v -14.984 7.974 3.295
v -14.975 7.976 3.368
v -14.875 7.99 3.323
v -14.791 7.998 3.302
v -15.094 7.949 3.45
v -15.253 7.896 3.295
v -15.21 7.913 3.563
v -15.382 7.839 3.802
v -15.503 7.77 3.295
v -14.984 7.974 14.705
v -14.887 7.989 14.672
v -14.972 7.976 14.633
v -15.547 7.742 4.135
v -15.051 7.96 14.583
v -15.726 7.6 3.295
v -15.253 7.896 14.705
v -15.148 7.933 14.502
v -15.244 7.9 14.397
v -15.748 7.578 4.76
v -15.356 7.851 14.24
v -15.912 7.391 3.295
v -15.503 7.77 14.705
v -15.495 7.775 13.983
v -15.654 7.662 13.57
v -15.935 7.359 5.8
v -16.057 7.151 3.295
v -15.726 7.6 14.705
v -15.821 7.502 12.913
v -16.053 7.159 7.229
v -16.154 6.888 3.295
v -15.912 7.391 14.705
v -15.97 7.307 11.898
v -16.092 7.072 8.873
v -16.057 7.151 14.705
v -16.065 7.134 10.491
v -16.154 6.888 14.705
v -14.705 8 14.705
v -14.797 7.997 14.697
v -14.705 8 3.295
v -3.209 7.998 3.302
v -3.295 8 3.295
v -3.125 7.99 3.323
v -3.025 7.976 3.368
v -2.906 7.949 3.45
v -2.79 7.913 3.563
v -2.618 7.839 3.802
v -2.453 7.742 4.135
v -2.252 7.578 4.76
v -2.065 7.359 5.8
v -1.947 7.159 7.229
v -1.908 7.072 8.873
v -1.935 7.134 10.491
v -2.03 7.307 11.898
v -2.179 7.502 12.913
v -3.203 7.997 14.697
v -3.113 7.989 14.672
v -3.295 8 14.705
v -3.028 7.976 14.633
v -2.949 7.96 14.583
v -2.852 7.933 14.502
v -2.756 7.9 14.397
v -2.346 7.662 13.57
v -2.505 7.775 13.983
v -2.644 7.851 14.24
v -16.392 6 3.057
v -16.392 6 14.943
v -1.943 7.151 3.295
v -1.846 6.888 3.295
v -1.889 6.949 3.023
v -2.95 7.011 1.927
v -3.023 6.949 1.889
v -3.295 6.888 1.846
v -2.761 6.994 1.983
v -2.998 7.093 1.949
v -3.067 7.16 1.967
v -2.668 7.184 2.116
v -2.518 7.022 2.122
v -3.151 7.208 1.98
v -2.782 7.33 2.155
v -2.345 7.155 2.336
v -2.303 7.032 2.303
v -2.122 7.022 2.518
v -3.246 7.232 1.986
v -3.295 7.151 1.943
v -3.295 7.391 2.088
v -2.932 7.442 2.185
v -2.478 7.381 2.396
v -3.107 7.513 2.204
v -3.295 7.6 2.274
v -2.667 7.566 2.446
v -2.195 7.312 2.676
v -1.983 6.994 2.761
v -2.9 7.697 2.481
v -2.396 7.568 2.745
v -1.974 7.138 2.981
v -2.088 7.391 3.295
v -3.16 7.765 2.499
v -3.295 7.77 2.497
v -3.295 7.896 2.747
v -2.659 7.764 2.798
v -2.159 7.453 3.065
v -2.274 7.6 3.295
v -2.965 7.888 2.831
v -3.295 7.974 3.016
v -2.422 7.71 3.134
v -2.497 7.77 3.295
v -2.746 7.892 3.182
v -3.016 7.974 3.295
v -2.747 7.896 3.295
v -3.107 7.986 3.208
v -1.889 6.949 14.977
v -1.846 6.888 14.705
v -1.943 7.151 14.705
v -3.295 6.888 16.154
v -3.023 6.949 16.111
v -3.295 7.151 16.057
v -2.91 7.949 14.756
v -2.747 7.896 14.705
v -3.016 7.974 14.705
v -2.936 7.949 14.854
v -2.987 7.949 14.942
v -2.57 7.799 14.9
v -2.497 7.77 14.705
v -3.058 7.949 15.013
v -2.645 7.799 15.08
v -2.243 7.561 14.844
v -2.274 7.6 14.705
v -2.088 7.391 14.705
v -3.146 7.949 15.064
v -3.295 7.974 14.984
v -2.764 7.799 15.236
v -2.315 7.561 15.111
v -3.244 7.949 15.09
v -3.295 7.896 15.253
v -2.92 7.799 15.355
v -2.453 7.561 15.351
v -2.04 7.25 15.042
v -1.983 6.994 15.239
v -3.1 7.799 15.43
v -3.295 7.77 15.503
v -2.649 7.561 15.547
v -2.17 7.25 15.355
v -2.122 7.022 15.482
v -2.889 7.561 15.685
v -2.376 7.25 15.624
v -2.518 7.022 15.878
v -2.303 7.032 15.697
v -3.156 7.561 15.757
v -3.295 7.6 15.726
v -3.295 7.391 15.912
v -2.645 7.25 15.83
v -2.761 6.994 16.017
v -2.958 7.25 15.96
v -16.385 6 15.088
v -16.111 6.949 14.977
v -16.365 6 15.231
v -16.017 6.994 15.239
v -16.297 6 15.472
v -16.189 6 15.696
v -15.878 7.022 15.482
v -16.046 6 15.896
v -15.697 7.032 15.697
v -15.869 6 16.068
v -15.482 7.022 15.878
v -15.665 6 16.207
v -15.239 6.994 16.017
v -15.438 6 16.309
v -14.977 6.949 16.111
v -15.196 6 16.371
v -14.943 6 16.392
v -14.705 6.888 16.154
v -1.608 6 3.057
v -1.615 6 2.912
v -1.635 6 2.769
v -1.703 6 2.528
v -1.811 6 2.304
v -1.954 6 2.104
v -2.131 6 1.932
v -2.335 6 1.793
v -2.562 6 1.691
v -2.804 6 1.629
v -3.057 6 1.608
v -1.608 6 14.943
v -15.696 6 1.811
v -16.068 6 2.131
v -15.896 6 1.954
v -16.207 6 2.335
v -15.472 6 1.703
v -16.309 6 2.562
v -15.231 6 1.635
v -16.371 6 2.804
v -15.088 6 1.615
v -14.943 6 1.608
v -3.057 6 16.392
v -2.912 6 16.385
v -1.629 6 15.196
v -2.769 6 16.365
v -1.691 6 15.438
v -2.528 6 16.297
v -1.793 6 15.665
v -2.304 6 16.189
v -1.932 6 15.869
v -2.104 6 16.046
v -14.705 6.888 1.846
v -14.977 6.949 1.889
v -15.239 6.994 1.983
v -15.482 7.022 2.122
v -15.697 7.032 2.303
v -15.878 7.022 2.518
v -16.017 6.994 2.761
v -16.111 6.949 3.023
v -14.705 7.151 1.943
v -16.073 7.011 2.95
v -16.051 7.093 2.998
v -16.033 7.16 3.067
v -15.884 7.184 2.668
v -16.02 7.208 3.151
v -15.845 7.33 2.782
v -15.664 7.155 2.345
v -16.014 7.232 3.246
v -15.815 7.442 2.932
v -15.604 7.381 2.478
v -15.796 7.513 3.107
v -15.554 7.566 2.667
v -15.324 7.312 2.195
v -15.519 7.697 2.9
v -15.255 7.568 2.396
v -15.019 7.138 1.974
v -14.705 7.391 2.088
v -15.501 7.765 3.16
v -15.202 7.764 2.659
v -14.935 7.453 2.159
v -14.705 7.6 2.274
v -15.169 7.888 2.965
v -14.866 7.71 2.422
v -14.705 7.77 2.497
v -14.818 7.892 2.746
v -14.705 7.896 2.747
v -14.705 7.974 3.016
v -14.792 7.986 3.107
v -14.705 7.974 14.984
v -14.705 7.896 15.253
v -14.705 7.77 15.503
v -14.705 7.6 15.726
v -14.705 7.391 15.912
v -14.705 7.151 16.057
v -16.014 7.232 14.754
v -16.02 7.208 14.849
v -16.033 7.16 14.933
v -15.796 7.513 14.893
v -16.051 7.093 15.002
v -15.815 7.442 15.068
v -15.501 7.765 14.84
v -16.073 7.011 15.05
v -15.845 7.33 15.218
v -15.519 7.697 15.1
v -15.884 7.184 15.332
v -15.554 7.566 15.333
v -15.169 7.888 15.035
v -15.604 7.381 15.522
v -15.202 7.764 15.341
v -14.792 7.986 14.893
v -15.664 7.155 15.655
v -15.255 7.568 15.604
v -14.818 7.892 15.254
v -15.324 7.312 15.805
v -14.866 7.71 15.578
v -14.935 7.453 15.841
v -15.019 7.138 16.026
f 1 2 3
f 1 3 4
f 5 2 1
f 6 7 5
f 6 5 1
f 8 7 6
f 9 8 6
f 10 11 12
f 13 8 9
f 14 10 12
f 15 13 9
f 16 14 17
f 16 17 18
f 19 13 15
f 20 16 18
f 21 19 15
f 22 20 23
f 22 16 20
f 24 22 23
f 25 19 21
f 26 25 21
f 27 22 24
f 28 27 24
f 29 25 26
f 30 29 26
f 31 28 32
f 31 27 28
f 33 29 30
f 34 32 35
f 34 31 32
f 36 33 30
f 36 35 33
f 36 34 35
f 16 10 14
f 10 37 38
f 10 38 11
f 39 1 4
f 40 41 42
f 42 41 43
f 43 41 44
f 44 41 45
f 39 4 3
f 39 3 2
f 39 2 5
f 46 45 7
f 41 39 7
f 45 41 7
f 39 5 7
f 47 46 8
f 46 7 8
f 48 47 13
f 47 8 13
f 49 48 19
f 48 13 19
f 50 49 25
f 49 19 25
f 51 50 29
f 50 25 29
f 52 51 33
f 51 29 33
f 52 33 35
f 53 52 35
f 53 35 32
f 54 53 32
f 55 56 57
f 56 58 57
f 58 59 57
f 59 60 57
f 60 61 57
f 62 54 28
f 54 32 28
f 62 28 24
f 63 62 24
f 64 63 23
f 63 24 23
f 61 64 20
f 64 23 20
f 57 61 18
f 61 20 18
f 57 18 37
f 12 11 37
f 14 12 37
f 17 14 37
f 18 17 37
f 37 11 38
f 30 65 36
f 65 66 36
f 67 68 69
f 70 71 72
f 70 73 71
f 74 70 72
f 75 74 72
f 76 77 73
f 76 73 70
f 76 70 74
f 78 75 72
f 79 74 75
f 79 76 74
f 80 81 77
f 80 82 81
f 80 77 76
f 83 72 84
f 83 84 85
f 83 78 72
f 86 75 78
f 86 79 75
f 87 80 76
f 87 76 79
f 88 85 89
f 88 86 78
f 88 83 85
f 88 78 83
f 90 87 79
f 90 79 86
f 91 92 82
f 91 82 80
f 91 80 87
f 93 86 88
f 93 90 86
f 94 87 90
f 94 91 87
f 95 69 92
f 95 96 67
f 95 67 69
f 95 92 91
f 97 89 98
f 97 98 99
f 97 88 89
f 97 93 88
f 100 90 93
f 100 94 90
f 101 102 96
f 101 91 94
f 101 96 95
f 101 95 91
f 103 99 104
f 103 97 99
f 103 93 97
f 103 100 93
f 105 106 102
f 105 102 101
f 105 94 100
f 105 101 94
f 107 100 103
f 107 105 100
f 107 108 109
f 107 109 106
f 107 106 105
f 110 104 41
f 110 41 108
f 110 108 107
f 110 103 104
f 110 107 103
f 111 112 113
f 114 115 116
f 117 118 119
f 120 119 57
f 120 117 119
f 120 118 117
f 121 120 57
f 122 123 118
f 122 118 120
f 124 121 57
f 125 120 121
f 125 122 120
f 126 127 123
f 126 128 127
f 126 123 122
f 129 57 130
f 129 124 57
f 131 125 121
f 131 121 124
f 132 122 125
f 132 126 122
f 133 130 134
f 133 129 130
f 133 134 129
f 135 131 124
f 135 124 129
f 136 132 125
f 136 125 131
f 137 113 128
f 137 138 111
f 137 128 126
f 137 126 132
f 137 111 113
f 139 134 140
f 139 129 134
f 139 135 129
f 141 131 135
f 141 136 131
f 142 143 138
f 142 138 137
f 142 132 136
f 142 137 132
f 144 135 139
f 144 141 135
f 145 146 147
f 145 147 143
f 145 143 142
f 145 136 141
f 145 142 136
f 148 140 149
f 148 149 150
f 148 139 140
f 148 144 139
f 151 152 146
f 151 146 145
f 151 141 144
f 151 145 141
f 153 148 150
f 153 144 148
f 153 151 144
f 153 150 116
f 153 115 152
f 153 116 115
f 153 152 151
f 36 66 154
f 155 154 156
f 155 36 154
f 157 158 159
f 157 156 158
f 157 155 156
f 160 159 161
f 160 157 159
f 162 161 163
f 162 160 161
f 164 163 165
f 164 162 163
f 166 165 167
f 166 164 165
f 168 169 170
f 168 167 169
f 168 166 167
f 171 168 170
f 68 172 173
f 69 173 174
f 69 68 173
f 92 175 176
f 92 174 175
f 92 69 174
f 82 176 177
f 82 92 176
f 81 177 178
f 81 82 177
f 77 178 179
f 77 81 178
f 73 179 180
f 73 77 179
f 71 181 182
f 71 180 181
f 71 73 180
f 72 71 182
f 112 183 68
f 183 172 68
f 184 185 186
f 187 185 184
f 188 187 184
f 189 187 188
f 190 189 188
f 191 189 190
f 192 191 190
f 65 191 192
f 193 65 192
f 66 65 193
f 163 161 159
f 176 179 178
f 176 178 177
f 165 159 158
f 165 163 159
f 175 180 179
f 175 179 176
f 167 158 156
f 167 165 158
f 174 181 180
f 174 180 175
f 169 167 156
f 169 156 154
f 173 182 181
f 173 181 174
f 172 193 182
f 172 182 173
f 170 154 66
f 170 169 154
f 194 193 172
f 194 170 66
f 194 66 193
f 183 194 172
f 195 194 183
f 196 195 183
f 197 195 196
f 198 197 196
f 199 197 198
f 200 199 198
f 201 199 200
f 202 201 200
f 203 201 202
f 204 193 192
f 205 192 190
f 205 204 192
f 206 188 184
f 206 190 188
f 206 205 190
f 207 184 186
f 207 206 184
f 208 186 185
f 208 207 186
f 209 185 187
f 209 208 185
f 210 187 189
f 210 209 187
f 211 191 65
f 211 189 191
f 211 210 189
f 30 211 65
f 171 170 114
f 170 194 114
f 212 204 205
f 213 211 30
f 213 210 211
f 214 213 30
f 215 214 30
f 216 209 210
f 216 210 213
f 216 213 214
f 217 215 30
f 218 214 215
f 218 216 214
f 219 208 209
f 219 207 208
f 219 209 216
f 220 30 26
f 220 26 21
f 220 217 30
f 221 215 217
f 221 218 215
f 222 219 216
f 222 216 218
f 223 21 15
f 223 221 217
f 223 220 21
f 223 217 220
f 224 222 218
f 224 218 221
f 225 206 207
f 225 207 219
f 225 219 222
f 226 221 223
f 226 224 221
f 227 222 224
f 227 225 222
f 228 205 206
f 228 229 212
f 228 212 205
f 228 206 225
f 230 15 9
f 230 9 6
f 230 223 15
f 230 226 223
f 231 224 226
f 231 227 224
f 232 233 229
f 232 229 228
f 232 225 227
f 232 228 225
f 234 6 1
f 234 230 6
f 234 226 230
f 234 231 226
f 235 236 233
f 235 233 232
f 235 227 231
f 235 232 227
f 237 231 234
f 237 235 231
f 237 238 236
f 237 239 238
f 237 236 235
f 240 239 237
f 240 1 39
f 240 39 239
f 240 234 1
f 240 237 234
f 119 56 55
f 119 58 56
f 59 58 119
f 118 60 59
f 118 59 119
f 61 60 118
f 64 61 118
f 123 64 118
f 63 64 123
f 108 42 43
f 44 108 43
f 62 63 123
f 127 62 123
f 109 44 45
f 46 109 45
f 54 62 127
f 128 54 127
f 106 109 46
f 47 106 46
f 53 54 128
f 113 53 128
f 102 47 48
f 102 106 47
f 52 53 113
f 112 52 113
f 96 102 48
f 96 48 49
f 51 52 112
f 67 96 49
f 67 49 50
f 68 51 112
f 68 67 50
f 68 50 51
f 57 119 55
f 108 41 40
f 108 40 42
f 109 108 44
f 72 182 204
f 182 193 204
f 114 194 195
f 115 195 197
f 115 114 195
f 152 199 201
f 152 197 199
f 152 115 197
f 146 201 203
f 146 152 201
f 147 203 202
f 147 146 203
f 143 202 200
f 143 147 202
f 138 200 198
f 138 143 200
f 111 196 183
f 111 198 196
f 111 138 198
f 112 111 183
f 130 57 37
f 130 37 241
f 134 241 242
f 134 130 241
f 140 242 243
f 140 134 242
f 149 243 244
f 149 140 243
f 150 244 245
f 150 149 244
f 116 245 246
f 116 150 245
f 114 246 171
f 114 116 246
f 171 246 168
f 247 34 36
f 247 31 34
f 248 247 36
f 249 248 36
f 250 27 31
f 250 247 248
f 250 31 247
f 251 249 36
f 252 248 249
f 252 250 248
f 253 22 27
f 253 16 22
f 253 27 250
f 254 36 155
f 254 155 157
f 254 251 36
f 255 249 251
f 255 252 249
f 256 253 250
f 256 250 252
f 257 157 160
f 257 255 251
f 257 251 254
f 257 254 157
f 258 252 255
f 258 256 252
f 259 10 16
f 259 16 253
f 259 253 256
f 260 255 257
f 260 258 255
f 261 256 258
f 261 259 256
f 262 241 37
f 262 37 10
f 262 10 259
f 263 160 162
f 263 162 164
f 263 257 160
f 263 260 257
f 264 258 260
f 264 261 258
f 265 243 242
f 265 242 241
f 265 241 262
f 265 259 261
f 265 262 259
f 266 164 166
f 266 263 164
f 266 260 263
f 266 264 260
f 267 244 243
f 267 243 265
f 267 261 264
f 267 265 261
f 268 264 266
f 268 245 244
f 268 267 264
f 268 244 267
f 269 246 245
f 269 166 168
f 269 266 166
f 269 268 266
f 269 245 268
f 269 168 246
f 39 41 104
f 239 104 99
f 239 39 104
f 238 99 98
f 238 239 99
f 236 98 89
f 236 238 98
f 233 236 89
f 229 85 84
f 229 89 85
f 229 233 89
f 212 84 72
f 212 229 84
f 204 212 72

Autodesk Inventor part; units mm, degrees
ref_plane "YZ Plane" through (0, 0, 0) normal (1, 0, 0) x (0, 1, 0)
ref_plane "XZ Plane" through (0, 0, 0) normal (0, 1, 0) x (-1, 0, 0)
sketch "Sketch1" plane through (0, 0, 0) normal (0, 1, 0) x (-1, 0, 0)
  line L0 (0, 0) -> (18, 0)
  line L1 (18, 0) -> (18, 18)
  line L2 (18, 18) -> (0, 18)
  line L3 (0, 18) -> (0, 0)
  dimension "d0" = 18
  dimension "d1" = 18
extrude "Extrusion1" add sketch "Sketch1" along normal blind 8 draft -15
fillet "Fillet1" radius 1.5 8 edges at (-1.0718, 4, 16.9282) (-9, 8, 15.8564) (-2.1436, 8, 9) (-9, 8, 2.1436) (-1.0718, 4, 1.0718) (-16.9282, 4, 1.0718) (-16.9282, 4, 16.9282) (-15.8564, 8, 9)
ref_plane "Work Plane1" through (-9, 33.5885, 16.5511) normal (1, 0, 0) x (0, 0, -1)
sketch "Sketch2" plane through (-9, 33.5885, 16.5511) normal (1, 0, 0) x (0, 0, -1)
  line L0 (13.2565, -25.5885) -> (1.8457, -25.5885) projected
  arc A0 (14.7054, -26.7002) -> (13.2565, -25.5885) centre (13.2565, -27.0885) ccw projected
  arc A1 (1.8457, -25.5885) -> (13.2565, -25.5885) centre (7.5511, -8.5166) ccw
  point P0 (16.5511, -33.5885)
  point P1 (13.2565, -25.5885)
  dimension "d5" = 18
extrude "Extrusion2" cut sketch "Sketch2" along normal through all both and the other way through all
sketch "Sketch3" plane through (0, 0, 0) normal (0, -1, 0) x (1, 0, 0)
  line L0 (-16.5511, 18) -> (-1.4489, 18) construction
  line L1 (-9, 18) -> (-9, 0) construction
  line L2 (-1.4489, 0) -> (-16.5511, 0) construction
  line L3 (-18, 1.4489) -> (-18, 16.5511) construction
  line L4 (-18, 9) -> (0, 9) construction
  line L5 (-1, 1) -> (-17, 1)
  line L6 (-17, 1) -> (-17, 17)
  line L7 (-17, 17) -> (-1, 17)
  line L8 (-1, 17) -> (-1, 1)
  line L9 (-1, 1) -> (-17, 17) construction
  line L10 (-17, 1) -> (-1, 17) construction
  point P0 (0, 0)
  point P1 (-9, 9)
  point P2 (-9, 9)
  dimension "d8" = 16
  dimension "d9" = 16
extrude "Extrusion3" cut sketch "Sketch3" against normal blind 4.5 draft -15
sketch "Sketch4" plane through (0, 4.5, 0) normal (0, -1, 0) x (1, 0, 0)
  line L0 (-15.7942, 15.7942) -> (-15.7942, 2.2058) construction
  line L1 (-15.7942, 9) -> (-2.2058, 9) construction
  line L2 (-2.2058, 2.2058) -> (-2.2058, 15.7942) construction
  line L3 (-2.2058, 15.7942) -> (-15.7942, 15.7942) construction
  line L4 (-9, 15.7942) -> (-9, 2.2058) construction
  line L5 (-15.7942, 2.2058) -> (-2.2058, 2.2058) construction
  circle A0 centre (-9, 9) radius 2.775
  point P0 (0, 0)
  dimension "d12" = 5.55
extrude "Extrusion4" add sketch "Sketch4" along normal blind 4
sketch "Sketch5" plane through (-9, 0.5, 9) normal (0, -1, 0) x (1, 0, 0)
  line L0 (0.6, 2.075) -> (-0.6, 2.075)
  line L1 (-0.6, -2.075) -> (0.6, -2.075)
  line L2 (-0.6, 2.075) -> (0.6, -2.075) construction
  line L3 (-2.075, 0.6) -> (-2.075, -0.6)
  line L4 (2.075, -0.6) -> (2.075, 0.6)
  line L5 (2.075, 0.6) -> (-2.075, -0.6) construction
  line L6 (-2.075, 0.6) -> (2.075, -0.6) construction
  line L7 (-6.7942, 6.7942) -> (-6.7942, -6.7942) construction
  line L8 (-6.7942, 0) -> (6.7942, 0) construction
  line L9 (6.7942, -6.7942) -> (6.7942, 6.7942) construction
  line L10 (-6.7942, -6.7942) -> (6.7942, -6.7942) construction
  line L11 (0, -6.7942) -> (0, 6.7942) construction
  arc A0 (0.9, -0.6) -> (0.6, -0.9) centre (0.9, -0.9) ccw
  arc A1 (-0.6, -0.9) -> (-0.9, -0.6) centre (-0.9, -0.9) ccw
  arc A2 (0.6, 0.9) -> (0.9, 0.6) centre (0.9, 0.9) ccw
  arc A3 (-0.9, 0.6) -> (-0.6, 0.9) centre (-0.9, 0.9) ccw
  line L12 (-0.6, 2.075) -> (-0.6, 0.9)
  line L13 (-0.6, -0.9) -> (-0.6, -2.075)
  line L14 (-2.075, -0.6) -> (-0.9, -0.6)
  line L15 (-0.9, 0.6) -> (-2.075, 0.6)
  line L16 (0.6, 2.075) -> (0.1735, 0.6) construction
  line L17 (0, 0) -> (-0.6, -2.075) construction
  line L18 (2.075, 0.6) -> (0.9, 0.6)
  line L19 (0.9, -0.6) -> (2.075, -0.6)
  line L20 (0.6, -2.075) -> (0.6, -0.9)
  line L21 (0.6, 0.9) -> (0.6, 2.075)
  point P0 (9, -9)
  dimension "d15" = 1.2
  dimension "d16" = 4.15
  dimension "d17" = 4.15
  dimension "d18" = 1.2
  dimension "d19" = 0.3
extrude "Extrusion5" cut sketch "Sketch5" against normal blind 4
ref_plane "Work Plane3" through (0, 6, 0) normal (0, -1, 0) x (1, 0, 0)
split_face "Split1"
sketch "Sketch7" plane through (0, 6, 0) normal (0, -1, 0) x (1, 0, 0)
  line L0 (-25.6931, 27.6788) -> (12.1363, 27.6788)
  line L1 (12.1363, 27.6788) -> (12.1363, -37.3947)
  line L2 (12.1363, -37.3947) -> (-25.6931, -37.3947)
  line L3 (-25.6931, -37.3947) -> (-25.6931, 27.6788)
  point P0 (0, 0)
extrude "Extrusion7" cut sketch "Sketch7" along normal blind 10
properties part number "top"
